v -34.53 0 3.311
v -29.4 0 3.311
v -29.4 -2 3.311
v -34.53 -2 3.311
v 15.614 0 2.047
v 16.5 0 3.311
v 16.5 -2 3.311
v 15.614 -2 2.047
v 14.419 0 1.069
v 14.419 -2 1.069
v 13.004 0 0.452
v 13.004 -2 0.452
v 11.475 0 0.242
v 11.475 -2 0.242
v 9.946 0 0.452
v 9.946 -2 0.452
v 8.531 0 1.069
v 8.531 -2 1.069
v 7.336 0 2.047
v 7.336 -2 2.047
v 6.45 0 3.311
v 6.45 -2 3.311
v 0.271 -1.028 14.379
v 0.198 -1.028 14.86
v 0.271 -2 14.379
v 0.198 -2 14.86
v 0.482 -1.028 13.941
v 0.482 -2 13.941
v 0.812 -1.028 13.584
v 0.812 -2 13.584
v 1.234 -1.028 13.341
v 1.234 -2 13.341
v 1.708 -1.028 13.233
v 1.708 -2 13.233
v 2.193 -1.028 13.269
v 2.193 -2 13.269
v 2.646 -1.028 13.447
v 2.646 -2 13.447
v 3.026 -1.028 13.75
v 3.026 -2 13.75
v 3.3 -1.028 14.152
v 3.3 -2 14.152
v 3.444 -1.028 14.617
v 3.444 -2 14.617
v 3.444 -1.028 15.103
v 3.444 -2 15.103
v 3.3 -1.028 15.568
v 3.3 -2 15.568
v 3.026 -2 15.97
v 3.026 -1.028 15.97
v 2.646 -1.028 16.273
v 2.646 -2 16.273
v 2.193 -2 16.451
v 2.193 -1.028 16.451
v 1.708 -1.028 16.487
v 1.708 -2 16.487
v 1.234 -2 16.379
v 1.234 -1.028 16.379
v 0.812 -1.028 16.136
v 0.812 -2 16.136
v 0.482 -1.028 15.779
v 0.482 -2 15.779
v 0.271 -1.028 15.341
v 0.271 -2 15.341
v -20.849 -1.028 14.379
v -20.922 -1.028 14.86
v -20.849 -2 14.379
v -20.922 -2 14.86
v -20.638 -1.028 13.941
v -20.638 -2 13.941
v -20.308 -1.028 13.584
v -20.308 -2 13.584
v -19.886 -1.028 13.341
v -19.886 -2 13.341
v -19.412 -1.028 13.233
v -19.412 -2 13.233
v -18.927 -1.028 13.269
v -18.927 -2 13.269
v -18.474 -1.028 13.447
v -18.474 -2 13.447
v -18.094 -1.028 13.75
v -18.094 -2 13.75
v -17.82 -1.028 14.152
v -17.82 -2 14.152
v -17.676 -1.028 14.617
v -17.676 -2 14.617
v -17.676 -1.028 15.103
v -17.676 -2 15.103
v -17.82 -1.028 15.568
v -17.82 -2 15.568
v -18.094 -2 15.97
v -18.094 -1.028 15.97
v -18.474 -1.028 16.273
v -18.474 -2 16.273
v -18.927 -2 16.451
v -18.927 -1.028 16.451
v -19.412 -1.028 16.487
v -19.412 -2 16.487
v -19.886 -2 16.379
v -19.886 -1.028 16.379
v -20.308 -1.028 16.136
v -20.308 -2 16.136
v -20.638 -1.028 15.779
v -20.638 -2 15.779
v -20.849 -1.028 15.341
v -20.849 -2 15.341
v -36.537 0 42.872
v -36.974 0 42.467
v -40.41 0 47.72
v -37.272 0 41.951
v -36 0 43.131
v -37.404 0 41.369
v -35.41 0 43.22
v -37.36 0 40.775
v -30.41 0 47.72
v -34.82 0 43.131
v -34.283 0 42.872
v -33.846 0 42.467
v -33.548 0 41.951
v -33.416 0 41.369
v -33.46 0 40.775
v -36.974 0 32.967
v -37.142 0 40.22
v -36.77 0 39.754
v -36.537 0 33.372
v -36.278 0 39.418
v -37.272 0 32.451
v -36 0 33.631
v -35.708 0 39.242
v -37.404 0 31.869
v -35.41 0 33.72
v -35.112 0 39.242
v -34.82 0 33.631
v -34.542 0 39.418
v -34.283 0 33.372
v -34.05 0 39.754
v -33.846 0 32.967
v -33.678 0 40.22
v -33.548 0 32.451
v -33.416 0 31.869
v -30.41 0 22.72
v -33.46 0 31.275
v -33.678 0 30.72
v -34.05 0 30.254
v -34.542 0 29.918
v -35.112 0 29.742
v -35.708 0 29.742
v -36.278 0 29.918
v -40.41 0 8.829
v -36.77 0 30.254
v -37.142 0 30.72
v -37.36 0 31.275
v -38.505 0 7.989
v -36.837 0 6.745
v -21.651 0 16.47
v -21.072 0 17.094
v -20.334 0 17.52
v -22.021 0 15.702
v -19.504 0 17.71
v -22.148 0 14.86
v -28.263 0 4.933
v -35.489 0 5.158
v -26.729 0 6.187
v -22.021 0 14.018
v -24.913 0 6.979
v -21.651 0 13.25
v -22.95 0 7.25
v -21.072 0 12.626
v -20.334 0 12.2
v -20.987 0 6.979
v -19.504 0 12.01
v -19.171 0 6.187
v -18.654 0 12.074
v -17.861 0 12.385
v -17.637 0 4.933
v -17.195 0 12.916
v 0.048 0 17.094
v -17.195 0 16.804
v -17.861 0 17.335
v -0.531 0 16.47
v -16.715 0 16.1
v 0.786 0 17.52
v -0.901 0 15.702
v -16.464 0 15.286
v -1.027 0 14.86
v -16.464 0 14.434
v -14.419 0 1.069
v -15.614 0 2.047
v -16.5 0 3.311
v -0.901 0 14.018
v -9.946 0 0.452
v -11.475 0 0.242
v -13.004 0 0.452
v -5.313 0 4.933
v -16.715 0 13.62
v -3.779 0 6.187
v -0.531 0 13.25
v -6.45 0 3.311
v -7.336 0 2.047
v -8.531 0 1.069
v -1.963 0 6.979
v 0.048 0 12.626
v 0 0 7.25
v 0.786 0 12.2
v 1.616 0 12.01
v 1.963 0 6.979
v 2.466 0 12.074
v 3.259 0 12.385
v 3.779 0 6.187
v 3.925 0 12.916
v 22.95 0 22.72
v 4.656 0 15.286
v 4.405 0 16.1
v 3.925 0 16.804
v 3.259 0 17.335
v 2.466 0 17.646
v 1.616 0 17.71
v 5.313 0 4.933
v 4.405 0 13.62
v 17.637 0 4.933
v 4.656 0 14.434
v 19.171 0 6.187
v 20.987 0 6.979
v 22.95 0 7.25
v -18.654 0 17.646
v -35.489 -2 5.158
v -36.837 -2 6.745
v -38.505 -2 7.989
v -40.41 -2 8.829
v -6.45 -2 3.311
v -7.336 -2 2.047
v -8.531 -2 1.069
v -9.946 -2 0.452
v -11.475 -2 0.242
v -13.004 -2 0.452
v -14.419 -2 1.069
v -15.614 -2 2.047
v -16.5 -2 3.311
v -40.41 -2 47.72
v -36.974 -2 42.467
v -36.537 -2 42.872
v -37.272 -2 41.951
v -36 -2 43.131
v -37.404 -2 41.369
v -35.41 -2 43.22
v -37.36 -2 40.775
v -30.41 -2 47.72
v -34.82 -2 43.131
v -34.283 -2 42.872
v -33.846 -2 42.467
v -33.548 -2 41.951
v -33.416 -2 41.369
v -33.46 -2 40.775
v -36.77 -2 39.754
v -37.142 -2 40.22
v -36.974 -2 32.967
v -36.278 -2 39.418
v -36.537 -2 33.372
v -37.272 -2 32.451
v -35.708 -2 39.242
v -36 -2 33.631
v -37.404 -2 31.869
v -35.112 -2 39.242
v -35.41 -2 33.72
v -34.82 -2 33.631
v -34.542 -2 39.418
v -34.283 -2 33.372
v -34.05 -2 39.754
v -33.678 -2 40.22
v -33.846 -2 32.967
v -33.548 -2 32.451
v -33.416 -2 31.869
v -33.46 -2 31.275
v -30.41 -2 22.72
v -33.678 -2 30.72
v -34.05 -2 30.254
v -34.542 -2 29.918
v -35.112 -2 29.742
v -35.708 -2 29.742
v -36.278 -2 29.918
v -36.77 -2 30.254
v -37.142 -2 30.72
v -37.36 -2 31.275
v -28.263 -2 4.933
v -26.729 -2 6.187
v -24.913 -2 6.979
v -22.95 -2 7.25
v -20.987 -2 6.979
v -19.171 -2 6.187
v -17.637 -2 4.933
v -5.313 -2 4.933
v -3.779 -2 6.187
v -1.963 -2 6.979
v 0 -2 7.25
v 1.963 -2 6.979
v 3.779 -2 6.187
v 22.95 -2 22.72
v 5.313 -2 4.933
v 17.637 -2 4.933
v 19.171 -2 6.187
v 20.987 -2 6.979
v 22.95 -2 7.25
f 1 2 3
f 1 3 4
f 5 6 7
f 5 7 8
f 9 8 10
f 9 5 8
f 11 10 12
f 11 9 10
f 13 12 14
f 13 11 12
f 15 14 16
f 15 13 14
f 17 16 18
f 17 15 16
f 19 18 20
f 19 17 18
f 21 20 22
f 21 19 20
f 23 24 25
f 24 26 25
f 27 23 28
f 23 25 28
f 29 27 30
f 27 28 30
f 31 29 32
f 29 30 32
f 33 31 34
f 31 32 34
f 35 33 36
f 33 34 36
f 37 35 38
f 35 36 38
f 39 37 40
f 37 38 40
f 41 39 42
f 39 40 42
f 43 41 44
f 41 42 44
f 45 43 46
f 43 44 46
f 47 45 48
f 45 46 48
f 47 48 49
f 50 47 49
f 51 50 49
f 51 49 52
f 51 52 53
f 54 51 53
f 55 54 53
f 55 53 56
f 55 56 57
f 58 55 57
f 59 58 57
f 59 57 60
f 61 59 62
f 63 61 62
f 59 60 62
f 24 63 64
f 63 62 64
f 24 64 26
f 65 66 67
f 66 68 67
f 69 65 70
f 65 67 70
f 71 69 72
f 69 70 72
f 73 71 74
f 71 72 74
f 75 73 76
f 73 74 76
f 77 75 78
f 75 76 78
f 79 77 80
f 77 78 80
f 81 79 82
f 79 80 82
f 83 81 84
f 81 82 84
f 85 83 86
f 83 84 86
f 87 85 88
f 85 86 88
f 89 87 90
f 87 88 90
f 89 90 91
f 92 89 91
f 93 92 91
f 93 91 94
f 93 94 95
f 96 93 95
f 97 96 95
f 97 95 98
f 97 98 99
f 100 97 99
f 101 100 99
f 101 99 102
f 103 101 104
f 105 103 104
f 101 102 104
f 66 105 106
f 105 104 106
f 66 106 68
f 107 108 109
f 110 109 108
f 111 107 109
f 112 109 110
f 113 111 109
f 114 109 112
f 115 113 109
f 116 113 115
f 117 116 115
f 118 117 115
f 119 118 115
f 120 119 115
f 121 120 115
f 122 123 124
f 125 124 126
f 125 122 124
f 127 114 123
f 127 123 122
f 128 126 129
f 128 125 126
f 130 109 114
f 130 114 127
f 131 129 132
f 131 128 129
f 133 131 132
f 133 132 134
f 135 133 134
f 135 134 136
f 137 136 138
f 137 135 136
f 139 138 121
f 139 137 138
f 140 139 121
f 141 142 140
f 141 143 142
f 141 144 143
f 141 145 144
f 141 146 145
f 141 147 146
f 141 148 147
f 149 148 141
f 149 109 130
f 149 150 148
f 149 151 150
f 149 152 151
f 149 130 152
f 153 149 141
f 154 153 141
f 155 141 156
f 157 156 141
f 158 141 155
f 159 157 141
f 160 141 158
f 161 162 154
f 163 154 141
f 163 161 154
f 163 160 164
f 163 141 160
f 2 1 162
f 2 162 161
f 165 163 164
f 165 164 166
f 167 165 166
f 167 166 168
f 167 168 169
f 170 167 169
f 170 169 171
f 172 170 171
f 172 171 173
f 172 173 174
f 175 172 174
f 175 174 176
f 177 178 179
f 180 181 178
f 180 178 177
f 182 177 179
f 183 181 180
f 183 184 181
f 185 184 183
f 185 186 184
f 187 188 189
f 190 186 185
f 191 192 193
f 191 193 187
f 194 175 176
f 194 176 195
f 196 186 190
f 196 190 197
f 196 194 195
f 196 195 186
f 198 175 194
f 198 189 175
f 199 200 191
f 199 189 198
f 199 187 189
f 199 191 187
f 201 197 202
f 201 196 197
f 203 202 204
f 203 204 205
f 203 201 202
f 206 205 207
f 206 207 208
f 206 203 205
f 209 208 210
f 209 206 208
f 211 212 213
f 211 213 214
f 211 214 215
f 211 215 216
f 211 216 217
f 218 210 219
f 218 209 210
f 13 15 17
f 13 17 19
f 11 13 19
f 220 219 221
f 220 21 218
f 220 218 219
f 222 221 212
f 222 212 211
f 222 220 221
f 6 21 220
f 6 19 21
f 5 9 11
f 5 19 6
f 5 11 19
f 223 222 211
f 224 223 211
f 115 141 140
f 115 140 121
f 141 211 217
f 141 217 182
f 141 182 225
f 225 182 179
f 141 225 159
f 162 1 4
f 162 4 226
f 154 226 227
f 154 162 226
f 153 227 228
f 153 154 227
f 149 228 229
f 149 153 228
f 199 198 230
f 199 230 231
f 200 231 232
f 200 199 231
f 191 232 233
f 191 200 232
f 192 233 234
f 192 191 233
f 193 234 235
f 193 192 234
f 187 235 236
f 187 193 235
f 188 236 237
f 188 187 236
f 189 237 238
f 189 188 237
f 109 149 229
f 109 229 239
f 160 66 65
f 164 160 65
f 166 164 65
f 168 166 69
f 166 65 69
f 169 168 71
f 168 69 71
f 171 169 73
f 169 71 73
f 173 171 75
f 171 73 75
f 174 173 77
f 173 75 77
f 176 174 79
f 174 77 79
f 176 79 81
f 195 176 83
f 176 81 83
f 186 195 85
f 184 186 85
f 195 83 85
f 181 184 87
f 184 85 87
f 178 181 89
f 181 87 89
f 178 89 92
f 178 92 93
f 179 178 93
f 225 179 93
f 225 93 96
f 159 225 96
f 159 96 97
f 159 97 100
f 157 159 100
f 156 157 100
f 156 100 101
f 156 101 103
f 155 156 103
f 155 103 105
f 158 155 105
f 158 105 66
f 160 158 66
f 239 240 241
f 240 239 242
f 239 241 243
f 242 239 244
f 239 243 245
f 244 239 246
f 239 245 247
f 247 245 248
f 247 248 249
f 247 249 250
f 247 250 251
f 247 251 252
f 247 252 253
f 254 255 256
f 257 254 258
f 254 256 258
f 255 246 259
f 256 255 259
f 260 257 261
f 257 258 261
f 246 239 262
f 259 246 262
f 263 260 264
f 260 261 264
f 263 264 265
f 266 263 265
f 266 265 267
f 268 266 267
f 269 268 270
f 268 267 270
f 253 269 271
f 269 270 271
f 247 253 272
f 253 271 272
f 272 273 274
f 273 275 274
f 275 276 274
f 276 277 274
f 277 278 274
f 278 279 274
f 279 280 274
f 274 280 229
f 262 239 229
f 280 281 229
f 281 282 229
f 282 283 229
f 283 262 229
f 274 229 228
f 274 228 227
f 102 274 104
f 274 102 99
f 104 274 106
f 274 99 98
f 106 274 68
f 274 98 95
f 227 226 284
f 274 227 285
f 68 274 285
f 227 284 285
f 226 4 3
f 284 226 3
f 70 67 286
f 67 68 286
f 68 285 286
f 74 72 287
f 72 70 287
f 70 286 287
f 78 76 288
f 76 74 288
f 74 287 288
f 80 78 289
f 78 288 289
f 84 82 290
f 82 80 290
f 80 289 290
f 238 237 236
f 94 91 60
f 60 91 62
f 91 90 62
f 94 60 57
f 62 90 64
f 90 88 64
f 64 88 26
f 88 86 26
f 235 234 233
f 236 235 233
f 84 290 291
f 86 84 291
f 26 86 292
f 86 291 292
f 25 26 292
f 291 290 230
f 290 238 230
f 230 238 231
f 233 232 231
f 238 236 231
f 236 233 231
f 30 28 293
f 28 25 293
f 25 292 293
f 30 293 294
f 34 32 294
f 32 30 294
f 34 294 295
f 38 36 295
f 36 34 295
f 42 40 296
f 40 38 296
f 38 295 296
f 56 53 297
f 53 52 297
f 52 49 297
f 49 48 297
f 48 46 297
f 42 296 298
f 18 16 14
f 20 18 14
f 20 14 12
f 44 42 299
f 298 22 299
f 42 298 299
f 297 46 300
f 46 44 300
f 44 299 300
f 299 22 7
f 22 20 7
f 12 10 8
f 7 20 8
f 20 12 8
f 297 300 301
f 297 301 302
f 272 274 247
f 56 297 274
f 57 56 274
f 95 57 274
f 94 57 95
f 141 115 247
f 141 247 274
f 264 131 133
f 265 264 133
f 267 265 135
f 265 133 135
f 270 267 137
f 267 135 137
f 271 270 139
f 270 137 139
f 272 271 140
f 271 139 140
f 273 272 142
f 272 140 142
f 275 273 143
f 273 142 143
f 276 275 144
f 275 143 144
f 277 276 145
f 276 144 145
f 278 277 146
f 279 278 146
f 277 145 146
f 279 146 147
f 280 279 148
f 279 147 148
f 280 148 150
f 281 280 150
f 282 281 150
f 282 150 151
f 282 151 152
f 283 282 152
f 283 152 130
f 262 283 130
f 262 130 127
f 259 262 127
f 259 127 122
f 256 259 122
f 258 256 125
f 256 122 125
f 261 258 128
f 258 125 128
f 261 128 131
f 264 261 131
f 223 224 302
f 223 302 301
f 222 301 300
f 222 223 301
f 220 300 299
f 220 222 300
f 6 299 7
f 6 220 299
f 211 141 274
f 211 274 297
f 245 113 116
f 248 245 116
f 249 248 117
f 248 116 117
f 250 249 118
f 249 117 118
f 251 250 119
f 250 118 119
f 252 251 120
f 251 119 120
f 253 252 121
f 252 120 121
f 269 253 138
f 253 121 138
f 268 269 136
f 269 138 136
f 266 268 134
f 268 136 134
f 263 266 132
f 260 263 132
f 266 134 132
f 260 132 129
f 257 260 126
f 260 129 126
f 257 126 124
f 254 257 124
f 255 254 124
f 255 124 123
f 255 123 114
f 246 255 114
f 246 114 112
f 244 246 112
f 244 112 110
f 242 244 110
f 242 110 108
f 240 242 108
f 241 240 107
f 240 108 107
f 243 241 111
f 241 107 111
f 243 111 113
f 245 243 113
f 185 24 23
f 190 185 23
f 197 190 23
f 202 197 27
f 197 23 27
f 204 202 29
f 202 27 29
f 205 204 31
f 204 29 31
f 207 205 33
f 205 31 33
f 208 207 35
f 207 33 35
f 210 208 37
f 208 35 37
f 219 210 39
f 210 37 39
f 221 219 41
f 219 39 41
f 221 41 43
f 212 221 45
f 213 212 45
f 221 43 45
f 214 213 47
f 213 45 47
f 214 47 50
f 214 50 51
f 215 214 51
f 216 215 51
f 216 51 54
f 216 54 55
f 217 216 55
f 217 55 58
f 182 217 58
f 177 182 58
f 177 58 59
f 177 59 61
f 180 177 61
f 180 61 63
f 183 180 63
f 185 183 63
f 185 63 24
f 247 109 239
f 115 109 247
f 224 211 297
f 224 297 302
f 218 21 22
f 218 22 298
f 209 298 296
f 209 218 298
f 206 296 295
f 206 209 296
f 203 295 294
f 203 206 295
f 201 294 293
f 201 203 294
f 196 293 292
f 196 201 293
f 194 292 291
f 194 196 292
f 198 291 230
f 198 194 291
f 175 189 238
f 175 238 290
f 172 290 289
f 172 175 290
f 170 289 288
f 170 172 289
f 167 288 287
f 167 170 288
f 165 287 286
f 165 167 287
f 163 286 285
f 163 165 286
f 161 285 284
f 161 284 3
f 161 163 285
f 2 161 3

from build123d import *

# Parameters (mm, degrees)
BASE_FLANGE1_DEPTH                                = 2
SKETCH7_R                                         = 2
CUT_EXTRUDE1_DEPTH                                = 2
CSK_FOR_4_FLAT_HEAD_MACHINE_SCREW_100_D           = 3.2639
CSK_FOR_4_FLAT_HEAD_MACHINE_SCREW_100_DEPTH       = 2
CSK_FOR_4_FLAT_HEAD_MACHINE_SCREW_100_CSINK_D     = 5.715
CSK_FOR_4_FLAT_HEAD_MACHINE_SCREW_100_CSINK_ANGLE = 100
CSK_FOR_4_FLAT_HEAD_MACHINE_SCREW_100_TIP         = 0.980574487


# Sheet-metal steps are written as plain solids
with BuildPart() as part:
    # Sketch2 → Base-Flange1 (new body)
    with BuildSketch(Plane(origin=(0, 0, 0), x_dir=(1, 0, 0), z_dir=(0, 1, 0))):
        with BuildLine():
            Line((-29.4, -3.310589071), (-34.53, -3.310589071))
            ThreePointArc((-34.53, -3.310589071), (-36.836910234, -6.744553073), (-40.41, -8.829492668))
            Line((-40.41, -8.829492668), (-40.41, -22.72))
            Line((-40.41, -22.72), (-40.41, -47.72))
            Line((-40.41, -47.72), (-30.41, -47.72))
            Line((-30.41, -47.72), (-30.41, -22.72))
            Line((-30.41, -22.72), (22.95, -22.72))
            Line((22.95, -22.72), (22.95, -7.25))
            ThreePointArc((22.95, -7.25), (19.171063031, -6.187255885), (16.5, -3.310589071))
            ThreePointArc((16.5, -3.310589071), (11.475, -0.241513115), (6.45, -3.310589071))
            ThreePointArc((6.45, -3.310589071), (0, -7.25), (-6.45, -3.310589071))
            ThreePointArc((-6.45, -3.310589071), (-11.475, -0.241513115), (-16.5, -3.310589071))
            ThreePointArc((-16.5, -3.310589071), (-22.95, -7.25), (-29.4, -3.310589071))
        make_face()
    extrude(amount=-BASE_FLANGE1_DEPTH)

    # Sketch7 → Cut-Extrude1 (cut)
    with BuildSketch(Plane(origin=(0, 0, 0), x_dir=(1, 0, 0), z_dir=(0, 1, 0))):
        with Locations(Location((-35.41, -41.22, 0), (0, 0, 270))):
            Circle(SKETCH7_R)
        with Locations(Location((-35.41, -31.72, 0), (0, 0, 270))):
            Circle(SKETCH7_R)
    extrude(amount=-CUT_EXTRUDE1_DEPTH, mode=Mode.SUBTRACT)

    # CSK for #4 Flat Head Machine Screw (100)1
    with Locations(Plane(origin=(0, 0, 0), x_dir=(1, 0, 0), z_dir=(0, 1, 0))):
        with Locations((-19.29, -14.86), (1.83, -14.86)):
            CounterSinkHole(CSK_FOR_4_FLAT_HEAD_MACHINE_SCREW_100_D / 2, CSK_FOR_4_FLAT_HEAD_MACHINE_SCREW_100_CSINK_D / 2, depth=CSK_FOR_4_FLAT_HEAD_MACHINE_SCREW_100_DEPTH, counter_sink_angle=CSK_FOR_4_FLAT_HEAD_MACHINE_SCREW_100_CSINK_ANGLE)
            with Locations((0, 0, -(CSK_FOR_4_FLAT_HEAD_MACHINE_SCREW_100_DEPTH + CSK_FOR_4_FLAT_HEAD_MACHINE_SCREW_100_TIP / 2))):  # 118° drill point
                Cone(0, CSK_FOR_4_FLAT_HEAD_MACHINE_SCREW_100_D / 2, CSK_FOR_4_FLAT_HEAD_MACHINE_SCREW_100_TIP, mode=Mode.SUBTRACT)


solid = part.part
